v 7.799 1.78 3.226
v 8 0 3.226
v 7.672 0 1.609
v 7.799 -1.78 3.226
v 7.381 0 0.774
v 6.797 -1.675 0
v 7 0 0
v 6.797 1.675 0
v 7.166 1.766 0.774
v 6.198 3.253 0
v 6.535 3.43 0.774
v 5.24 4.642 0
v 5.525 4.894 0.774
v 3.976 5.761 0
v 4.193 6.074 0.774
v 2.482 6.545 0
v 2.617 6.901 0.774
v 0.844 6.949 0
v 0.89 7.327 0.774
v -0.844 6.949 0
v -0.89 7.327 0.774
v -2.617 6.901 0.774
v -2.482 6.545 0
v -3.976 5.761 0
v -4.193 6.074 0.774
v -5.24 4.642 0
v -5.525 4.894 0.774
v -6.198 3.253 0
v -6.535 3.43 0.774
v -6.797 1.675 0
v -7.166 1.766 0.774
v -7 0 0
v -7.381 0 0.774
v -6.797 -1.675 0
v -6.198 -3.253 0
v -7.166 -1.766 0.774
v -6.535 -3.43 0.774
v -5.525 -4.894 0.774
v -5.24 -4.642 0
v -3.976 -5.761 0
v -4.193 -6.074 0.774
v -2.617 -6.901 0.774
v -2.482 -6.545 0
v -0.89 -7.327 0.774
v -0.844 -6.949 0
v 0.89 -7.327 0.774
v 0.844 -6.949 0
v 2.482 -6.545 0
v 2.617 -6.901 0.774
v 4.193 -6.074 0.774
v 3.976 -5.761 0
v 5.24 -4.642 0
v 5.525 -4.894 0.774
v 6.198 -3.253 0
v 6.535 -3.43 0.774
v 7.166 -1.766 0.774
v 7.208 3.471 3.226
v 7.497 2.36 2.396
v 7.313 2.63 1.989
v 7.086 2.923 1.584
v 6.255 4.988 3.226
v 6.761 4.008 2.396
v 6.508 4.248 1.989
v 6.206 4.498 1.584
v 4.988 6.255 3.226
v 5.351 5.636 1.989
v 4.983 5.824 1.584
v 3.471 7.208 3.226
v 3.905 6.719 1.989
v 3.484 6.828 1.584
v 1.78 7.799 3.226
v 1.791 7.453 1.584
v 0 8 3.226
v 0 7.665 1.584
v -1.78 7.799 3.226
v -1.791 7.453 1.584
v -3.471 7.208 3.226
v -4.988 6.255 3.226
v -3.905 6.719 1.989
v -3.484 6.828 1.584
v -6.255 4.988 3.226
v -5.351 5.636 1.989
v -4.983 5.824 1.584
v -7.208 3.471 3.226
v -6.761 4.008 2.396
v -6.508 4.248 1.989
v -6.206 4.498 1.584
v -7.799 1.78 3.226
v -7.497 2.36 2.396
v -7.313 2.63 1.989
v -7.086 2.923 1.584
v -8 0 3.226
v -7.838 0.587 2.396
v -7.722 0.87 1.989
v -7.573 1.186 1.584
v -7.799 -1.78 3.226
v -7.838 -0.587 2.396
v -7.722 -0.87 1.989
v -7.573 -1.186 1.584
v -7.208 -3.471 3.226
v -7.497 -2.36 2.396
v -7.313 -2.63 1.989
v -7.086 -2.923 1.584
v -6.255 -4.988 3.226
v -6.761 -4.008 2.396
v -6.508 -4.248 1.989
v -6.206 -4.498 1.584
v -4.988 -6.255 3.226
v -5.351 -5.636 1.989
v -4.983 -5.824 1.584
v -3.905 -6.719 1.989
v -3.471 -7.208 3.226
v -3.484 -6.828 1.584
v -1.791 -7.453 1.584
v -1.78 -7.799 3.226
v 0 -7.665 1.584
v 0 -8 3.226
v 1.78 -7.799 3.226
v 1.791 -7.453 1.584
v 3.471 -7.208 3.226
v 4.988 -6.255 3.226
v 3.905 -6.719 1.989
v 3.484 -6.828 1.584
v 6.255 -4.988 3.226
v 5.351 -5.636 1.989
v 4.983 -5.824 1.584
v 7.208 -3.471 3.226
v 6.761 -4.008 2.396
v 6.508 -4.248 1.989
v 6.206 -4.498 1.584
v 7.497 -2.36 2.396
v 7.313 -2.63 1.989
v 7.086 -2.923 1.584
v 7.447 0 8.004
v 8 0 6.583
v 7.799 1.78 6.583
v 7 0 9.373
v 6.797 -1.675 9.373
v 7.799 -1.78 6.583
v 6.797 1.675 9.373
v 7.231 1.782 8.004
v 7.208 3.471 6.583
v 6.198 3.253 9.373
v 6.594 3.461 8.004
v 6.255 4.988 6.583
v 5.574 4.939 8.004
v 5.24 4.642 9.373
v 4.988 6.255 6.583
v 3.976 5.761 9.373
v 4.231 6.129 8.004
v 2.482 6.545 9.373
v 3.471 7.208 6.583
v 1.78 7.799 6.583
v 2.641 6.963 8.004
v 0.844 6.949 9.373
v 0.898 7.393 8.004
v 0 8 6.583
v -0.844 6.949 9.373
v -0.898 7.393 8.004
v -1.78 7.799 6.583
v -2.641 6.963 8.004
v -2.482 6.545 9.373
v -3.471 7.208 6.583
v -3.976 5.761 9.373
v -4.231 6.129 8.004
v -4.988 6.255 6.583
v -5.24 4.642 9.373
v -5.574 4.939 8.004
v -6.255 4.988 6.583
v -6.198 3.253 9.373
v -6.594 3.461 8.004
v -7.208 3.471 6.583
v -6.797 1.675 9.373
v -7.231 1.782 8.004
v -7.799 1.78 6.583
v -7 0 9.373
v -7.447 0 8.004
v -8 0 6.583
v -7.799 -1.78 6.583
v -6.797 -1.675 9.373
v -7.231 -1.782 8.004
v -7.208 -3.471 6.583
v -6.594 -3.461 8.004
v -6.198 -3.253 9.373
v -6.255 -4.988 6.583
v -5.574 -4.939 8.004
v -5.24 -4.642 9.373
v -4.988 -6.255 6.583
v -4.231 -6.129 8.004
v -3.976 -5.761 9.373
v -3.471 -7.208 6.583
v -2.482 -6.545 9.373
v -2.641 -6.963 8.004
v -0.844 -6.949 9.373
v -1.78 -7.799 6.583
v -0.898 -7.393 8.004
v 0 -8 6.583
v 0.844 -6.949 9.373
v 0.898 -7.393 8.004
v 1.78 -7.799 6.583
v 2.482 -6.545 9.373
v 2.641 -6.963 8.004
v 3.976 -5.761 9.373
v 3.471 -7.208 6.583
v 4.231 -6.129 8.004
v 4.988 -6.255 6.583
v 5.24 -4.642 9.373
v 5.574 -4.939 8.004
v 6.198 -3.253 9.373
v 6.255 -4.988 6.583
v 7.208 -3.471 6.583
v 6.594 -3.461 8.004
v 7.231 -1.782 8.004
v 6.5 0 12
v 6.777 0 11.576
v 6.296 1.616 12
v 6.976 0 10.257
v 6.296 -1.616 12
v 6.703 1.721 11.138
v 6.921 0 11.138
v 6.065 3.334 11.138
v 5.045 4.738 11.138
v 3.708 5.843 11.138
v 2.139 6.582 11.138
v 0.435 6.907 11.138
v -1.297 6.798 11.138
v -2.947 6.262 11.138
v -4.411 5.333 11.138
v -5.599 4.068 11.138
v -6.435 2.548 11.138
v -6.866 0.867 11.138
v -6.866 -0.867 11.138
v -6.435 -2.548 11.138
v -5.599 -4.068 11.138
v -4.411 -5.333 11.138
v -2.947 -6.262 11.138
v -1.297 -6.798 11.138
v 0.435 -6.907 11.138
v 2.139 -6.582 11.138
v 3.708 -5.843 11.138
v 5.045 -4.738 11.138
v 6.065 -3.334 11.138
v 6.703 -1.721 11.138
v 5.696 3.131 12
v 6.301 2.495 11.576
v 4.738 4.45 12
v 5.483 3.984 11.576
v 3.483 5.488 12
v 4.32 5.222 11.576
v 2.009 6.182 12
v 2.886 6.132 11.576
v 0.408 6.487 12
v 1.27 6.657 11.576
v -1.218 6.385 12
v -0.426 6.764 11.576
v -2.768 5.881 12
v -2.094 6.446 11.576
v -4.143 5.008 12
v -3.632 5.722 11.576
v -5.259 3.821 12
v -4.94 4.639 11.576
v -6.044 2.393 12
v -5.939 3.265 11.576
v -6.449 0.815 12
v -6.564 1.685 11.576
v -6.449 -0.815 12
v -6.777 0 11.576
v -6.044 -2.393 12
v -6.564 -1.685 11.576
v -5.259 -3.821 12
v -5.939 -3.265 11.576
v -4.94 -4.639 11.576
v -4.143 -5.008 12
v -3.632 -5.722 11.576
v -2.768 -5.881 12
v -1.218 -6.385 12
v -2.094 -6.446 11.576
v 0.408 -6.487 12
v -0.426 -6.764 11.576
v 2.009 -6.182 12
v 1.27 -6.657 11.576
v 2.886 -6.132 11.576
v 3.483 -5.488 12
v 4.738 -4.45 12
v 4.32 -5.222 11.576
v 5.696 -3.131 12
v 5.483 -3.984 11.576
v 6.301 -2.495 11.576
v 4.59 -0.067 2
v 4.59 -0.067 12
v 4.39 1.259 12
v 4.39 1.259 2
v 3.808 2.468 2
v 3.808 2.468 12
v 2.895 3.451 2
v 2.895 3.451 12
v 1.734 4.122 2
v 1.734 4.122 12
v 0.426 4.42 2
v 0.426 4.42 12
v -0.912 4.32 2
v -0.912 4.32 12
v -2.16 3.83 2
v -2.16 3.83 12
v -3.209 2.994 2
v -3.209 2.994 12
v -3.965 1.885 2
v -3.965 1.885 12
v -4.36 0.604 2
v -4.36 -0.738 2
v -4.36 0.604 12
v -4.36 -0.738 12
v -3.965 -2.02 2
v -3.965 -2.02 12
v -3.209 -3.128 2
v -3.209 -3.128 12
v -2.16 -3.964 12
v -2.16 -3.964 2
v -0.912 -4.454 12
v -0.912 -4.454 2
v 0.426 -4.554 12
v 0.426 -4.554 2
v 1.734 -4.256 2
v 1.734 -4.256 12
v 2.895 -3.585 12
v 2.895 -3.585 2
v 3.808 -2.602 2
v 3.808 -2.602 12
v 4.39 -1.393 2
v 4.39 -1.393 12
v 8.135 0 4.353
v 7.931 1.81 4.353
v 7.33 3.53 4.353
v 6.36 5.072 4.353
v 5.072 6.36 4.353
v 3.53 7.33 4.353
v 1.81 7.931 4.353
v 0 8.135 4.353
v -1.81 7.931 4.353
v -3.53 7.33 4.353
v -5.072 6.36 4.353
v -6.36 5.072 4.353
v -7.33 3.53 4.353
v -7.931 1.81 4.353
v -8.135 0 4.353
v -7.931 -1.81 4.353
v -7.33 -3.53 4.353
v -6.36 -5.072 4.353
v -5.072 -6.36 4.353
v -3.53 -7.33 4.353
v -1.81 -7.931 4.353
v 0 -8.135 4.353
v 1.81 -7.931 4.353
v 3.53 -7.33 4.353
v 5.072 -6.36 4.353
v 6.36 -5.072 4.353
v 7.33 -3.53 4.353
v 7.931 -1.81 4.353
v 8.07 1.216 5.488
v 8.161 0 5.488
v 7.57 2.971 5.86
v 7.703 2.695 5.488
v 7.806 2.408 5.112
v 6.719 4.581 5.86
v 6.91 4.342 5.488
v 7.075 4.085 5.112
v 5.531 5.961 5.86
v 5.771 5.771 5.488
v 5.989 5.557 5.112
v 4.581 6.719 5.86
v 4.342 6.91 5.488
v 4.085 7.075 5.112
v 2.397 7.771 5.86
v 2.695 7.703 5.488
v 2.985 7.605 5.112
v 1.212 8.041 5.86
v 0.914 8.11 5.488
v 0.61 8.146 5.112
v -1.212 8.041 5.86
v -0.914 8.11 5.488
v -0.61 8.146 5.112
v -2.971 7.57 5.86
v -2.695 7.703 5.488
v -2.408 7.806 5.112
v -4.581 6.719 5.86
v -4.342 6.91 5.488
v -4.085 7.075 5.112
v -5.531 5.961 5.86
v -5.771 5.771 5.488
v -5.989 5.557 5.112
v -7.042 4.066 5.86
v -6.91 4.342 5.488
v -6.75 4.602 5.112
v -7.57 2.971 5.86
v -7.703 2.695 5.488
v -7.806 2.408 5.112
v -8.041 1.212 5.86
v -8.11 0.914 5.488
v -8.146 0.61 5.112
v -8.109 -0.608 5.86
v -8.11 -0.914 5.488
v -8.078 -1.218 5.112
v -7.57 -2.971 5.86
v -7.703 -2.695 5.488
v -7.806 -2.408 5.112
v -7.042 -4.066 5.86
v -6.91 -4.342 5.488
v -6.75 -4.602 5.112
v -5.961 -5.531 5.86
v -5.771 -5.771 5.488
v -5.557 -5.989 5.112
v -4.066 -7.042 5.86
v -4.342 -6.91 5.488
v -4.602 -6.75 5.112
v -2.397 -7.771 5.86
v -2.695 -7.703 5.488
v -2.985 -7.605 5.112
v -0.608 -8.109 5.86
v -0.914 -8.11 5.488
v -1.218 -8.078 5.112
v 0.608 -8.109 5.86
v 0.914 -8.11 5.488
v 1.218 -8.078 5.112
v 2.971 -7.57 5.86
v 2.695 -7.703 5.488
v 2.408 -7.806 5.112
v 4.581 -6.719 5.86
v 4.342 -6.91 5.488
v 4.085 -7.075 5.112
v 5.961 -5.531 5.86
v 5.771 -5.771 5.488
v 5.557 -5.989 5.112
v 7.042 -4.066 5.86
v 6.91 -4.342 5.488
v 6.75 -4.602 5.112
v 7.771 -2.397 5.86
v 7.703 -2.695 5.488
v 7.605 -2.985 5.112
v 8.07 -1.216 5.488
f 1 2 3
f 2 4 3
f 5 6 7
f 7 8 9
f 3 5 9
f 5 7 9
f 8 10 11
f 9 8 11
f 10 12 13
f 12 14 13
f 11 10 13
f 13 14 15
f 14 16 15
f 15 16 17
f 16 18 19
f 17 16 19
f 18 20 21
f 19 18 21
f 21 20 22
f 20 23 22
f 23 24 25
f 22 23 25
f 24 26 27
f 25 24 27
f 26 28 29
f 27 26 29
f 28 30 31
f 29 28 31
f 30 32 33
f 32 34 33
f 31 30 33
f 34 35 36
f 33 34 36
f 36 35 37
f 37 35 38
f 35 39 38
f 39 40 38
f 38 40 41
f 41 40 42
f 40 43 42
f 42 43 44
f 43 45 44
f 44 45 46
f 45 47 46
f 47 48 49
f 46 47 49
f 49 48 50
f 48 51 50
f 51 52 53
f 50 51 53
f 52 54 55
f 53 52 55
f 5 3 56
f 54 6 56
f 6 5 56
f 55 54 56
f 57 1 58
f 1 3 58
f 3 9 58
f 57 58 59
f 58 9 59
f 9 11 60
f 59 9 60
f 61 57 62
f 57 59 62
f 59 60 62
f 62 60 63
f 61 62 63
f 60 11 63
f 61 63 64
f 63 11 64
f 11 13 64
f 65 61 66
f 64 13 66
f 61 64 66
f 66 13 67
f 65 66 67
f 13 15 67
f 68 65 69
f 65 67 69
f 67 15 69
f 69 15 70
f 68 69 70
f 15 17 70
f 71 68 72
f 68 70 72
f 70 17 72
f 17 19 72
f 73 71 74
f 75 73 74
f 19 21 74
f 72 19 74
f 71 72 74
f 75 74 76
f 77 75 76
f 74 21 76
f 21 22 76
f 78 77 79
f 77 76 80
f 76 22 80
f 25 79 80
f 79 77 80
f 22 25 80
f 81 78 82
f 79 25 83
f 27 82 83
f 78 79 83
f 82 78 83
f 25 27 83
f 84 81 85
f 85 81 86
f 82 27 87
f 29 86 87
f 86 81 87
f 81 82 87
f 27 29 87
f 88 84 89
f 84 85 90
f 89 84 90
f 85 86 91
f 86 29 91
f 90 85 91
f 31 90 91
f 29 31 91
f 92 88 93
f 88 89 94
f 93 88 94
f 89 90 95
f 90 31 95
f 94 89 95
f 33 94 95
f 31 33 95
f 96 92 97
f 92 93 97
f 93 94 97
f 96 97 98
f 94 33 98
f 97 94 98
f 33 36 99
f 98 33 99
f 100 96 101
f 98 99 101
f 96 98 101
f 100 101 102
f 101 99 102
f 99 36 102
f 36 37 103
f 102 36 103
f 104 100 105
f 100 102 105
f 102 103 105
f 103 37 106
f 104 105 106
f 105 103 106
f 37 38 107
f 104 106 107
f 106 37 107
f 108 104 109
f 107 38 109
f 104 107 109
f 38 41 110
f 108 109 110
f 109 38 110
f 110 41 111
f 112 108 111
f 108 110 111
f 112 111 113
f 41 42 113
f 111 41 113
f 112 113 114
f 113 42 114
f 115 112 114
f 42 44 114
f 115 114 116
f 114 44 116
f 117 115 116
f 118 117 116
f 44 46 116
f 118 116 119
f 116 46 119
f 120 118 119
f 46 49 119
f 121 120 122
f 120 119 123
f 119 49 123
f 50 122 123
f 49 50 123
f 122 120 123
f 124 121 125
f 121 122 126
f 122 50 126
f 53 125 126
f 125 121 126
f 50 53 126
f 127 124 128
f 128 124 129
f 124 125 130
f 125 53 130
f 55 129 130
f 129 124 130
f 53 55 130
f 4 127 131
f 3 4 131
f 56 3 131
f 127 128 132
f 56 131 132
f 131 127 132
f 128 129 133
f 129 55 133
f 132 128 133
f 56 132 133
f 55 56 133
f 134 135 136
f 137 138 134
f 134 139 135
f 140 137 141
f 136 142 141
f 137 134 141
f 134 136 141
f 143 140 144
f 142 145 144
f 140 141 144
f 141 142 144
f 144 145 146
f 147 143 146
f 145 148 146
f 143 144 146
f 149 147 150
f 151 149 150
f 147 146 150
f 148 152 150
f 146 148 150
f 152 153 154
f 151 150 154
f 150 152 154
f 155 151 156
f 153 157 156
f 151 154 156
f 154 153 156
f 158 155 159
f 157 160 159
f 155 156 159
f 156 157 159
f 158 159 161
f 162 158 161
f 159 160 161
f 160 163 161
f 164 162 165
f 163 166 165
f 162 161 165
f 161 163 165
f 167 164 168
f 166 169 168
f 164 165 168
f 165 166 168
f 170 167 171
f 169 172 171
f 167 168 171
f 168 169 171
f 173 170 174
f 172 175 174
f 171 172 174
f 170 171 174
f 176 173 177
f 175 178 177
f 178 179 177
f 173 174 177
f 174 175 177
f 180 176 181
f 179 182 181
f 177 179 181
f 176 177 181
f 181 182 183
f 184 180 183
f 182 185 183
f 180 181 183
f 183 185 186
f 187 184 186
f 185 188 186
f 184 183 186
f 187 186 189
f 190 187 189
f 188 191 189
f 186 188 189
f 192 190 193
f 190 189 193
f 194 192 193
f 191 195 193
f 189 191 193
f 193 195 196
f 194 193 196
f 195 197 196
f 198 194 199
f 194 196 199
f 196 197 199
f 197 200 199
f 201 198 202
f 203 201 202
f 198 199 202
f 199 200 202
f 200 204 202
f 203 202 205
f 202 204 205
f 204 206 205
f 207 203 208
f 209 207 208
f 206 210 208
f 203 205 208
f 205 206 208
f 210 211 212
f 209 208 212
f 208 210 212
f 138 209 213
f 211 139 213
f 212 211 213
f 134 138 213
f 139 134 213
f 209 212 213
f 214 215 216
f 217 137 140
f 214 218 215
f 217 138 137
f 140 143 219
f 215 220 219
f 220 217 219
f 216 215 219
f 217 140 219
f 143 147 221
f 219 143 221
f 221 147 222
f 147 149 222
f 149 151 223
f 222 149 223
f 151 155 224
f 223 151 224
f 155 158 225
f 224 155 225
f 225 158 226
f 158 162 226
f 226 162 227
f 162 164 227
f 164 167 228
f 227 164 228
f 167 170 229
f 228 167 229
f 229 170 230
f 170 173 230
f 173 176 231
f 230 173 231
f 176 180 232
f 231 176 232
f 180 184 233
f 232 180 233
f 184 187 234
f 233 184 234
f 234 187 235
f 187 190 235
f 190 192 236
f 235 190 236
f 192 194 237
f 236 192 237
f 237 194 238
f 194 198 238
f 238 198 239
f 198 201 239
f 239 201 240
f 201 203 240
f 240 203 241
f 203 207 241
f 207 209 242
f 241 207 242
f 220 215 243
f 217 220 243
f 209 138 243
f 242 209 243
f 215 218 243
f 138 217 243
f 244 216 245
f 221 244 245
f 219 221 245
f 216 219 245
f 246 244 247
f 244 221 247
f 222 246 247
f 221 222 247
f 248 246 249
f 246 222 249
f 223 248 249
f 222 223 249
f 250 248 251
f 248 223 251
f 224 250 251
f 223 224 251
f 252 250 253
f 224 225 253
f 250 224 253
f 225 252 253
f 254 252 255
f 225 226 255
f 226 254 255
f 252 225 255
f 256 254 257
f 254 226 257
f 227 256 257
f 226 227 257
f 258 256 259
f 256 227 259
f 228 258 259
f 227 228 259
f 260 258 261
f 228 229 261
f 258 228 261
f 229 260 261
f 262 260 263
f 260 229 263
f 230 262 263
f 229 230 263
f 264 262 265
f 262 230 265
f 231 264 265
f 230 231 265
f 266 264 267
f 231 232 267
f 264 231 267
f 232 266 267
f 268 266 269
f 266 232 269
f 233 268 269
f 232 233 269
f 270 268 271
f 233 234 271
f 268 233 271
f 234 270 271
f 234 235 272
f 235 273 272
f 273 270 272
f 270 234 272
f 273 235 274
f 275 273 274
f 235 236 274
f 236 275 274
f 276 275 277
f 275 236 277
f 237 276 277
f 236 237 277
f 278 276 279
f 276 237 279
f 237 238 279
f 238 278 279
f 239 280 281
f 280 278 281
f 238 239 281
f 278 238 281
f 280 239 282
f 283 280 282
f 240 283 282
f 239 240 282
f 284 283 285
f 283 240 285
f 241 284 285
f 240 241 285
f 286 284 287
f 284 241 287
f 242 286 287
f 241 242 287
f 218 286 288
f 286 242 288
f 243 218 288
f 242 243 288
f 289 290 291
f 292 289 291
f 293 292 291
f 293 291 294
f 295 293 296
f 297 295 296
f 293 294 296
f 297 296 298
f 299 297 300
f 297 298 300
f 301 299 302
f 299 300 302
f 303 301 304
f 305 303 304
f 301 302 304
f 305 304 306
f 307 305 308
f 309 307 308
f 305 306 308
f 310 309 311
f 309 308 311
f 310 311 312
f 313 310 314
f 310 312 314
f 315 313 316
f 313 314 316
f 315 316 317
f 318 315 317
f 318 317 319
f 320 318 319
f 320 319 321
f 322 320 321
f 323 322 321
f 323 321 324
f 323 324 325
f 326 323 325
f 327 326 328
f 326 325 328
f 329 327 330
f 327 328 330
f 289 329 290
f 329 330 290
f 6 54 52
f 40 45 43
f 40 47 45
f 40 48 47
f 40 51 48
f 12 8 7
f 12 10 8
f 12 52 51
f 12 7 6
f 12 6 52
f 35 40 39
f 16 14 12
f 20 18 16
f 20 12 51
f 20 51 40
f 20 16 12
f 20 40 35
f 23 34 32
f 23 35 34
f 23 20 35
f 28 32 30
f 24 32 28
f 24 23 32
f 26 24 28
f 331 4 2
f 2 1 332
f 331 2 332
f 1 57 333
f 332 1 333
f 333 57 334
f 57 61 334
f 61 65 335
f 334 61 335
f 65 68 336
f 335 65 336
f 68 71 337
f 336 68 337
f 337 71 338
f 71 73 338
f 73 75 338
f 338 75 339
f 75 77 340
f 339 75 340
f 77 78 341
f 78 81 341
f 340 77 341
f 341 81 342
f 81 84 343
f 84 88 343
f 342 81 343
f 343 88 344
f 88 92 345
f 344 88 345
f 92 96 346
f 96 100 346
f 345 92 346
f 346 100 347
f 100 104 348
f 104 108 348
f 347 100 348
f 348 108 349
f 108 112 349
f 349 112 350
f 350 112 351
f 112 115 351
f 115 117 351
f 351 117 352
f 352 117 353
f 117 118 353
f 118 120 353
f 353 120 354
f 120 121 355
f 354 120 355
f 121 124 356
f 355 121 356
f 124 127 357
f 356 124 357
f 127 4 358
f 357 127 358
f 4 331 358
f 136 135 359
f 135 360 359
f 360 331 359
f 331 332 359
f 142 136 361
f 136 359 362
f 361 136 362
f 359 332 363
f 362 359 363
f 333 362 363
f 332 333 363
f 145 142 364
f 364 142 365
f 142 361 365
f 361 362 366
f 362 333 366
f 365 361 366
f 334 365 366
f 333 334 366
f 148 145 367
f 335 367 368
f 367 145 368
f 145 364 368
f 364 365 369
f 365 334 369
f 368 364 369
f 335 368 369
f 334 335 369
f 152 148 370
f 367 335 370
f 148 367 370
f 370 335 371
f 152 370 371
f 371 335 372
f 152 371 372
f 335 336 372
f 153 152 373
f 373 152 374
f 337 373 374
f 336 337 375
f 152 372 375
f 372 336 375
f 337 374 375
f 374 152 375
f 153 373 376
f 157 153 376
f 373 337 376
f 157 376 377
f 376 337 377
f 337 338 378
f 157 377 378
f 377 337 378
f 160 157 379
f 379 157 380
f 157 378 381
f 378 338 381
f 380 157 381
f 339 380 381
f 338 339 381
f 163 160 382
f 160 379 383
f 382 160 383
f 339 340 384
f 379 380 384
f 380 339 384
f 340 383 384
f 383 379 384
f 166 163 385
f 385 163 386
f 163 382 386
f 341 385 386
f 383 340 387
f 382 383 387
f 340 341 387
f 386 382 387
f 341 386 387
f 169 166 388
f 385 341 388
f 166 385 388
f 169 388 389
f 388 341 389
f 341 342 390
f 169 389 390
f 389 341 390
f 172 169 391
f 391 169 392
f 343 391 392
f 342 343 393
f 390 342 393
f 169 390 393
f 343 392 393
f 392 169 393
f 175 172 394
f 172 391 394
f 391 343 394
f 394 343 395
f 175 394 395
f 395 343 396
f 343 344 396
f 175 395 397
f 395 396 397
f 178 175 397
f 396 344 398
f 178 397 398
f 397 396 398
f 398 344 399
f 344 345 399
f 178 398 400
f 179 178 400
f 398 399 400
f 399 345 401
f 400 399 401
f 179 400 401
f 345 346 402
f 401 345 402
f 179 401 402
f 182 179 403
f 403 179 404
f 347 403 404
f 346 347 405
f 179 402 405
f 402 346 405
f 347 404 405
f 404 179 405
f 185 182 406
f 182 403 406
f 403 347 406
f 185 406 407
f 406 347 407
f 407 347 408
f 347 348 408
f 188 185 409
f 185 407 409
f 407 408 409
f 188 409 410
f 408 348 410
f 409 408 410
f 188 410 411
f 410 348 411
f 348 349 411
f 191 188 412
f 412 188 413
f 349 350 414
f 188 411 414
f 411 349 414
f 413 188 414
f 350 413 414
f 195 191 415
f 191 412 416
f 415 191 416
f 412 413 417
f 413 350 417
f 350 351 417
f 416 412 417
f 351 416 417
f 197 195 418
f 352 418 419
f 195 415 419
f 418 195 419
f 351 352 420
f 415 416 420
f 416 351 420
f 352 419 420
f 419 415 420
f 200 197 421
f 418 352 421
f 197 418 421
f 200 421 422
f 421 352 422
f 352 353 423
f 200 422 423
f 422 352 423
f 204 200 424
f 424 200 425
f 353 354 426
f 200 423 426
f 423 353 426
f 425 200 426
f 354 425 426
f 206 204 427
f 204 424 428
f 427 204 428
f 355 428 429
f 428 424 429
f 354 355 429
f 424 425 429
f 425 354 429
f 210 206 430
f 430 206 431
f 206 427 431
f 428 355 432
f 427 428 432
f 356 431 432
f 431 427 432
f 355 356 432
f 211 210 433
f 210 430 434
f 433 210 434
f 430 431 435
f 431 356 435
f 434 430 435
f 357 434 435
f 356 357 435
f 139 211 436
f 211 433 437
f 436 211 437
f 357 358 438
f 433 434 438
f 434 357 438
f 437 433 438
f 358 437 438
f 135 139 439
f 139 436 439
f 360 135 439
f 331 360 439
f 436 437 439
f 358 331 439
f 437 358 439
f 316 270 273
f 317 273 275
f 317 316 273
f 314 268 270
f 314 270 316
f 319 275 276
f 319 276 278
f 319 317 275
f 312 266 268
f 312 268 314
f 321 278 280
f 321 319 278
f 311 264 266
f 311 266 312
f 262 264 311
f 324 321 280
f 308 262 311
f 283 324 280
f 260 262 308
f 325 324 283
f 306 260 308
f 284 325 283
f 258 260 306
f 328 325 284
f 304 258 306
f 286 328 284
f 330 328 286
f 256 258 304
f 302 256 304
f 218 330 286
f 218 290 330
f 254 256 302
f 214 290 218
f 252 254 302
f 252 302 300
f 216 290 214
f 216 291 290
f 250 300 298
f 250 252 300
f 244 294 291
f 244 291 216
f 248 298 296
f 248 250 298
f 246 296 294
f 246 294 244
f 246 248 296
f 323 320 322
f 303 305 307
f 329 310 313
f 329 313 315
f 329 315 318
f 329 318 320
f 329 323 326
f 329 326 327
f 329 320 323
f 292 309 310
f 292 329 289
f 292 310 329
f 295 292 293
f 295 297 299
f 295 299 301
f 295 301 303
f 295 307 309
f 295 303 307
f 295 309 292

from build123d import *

# Parameters (mm, degrees)
F2_R     = 4.5
F3_DEPTH = 10


with BuildPart() as f1:
    # F0 (on Front) → F1 (revolve)
    with BuildSketch(Plane.XZ):
        with BuildLine():
            Line((0, 3.2263717148), (0, 0))
            Line((0, 0), (7, 0))
            add(Edge.make_bspline(
                [(8, 3.2263717148), (7.8355180596, 2.1172188949), (7.6230442191, 1.0967952544), (7, 0)],
                knots=[0.7384488125, 0.7384488125, 0.7384488125, 0.7384488125, 1, 1, 1, 1], degree=3))
            Line((8, 3.2263717148), (0, 3.2263717148))
        make_face()
        with BuildLine():
            Line((0, 6.5826545469), (0, 3.2263717148))
            Line((0, 3.2263717148), (8, 3.2263717148))
            add(Edge.make_bspline(
                [(8, 6.5826545469), (8.2802285425, 5.5257675864), (8.163957424, 4.3319875582), (8, 3.2263717148)],
                knots=[0.4777316854, 0.4777316854, 0.4777316854, 0.4777316854, 0.7384488125, 0.7384488125, 0.7384488125, 0.7384488125], degree=3))
            Line((8, 6.5826545469), (0, 6.5826545469))
        make_face()
        with BuildLine():
            Line((0, 9.3732718378), (0, 6.5826545469))
            Line((0, 6.5826545469), (8, 6.5826545469))
            add(Edge.make_bspline(
                [(7, 9.3732718378), (7.1230782609, 8.4482807569), (7.7366398984, 7.5759218809), (8, 6.5826545469)],
                knots=[0.2327085037, 0.2327085037, 0.2327085037, 0.2327085037, 0.4777316854, 0.4777316854, 0.4777316854, 0.4777316854], degree=3))
            Line((7, 9.3732718378), (0, 9.3732718378))
        make_face()
        with BuildLine():
            Line((0, 12), (0, 9.3732718378))
            Line((0, 9.3732718378), (7, 9.3732718378))
            add(Edge.make_bspline(
                [(6.5, 12), (7.2086348102, 11.1777499536), (6.8831075585, 10.2517735735), (7, 9.3732718378)],
                knots=[0, 0, 0, 0, 0.2327085037, 0.2327085037, 0.2327085037, 0.2327085037], degree=3))
            Line((6.5, 12), (0, 12))
        make_face()
    revolve(axis=Axis((0, 0, 6), (0, 0, 1)))

    # F2 (on face) → F3 (cut)
    with BuildSketch(Plane.XY.offset(12)):
        with Locations((0.0896312558, -0.0670451336)):
            Circle(F2_R)
    extrude(amount=-F3_DEPTH, mode=Mode.SUBTRACT)


solid = f1.part
